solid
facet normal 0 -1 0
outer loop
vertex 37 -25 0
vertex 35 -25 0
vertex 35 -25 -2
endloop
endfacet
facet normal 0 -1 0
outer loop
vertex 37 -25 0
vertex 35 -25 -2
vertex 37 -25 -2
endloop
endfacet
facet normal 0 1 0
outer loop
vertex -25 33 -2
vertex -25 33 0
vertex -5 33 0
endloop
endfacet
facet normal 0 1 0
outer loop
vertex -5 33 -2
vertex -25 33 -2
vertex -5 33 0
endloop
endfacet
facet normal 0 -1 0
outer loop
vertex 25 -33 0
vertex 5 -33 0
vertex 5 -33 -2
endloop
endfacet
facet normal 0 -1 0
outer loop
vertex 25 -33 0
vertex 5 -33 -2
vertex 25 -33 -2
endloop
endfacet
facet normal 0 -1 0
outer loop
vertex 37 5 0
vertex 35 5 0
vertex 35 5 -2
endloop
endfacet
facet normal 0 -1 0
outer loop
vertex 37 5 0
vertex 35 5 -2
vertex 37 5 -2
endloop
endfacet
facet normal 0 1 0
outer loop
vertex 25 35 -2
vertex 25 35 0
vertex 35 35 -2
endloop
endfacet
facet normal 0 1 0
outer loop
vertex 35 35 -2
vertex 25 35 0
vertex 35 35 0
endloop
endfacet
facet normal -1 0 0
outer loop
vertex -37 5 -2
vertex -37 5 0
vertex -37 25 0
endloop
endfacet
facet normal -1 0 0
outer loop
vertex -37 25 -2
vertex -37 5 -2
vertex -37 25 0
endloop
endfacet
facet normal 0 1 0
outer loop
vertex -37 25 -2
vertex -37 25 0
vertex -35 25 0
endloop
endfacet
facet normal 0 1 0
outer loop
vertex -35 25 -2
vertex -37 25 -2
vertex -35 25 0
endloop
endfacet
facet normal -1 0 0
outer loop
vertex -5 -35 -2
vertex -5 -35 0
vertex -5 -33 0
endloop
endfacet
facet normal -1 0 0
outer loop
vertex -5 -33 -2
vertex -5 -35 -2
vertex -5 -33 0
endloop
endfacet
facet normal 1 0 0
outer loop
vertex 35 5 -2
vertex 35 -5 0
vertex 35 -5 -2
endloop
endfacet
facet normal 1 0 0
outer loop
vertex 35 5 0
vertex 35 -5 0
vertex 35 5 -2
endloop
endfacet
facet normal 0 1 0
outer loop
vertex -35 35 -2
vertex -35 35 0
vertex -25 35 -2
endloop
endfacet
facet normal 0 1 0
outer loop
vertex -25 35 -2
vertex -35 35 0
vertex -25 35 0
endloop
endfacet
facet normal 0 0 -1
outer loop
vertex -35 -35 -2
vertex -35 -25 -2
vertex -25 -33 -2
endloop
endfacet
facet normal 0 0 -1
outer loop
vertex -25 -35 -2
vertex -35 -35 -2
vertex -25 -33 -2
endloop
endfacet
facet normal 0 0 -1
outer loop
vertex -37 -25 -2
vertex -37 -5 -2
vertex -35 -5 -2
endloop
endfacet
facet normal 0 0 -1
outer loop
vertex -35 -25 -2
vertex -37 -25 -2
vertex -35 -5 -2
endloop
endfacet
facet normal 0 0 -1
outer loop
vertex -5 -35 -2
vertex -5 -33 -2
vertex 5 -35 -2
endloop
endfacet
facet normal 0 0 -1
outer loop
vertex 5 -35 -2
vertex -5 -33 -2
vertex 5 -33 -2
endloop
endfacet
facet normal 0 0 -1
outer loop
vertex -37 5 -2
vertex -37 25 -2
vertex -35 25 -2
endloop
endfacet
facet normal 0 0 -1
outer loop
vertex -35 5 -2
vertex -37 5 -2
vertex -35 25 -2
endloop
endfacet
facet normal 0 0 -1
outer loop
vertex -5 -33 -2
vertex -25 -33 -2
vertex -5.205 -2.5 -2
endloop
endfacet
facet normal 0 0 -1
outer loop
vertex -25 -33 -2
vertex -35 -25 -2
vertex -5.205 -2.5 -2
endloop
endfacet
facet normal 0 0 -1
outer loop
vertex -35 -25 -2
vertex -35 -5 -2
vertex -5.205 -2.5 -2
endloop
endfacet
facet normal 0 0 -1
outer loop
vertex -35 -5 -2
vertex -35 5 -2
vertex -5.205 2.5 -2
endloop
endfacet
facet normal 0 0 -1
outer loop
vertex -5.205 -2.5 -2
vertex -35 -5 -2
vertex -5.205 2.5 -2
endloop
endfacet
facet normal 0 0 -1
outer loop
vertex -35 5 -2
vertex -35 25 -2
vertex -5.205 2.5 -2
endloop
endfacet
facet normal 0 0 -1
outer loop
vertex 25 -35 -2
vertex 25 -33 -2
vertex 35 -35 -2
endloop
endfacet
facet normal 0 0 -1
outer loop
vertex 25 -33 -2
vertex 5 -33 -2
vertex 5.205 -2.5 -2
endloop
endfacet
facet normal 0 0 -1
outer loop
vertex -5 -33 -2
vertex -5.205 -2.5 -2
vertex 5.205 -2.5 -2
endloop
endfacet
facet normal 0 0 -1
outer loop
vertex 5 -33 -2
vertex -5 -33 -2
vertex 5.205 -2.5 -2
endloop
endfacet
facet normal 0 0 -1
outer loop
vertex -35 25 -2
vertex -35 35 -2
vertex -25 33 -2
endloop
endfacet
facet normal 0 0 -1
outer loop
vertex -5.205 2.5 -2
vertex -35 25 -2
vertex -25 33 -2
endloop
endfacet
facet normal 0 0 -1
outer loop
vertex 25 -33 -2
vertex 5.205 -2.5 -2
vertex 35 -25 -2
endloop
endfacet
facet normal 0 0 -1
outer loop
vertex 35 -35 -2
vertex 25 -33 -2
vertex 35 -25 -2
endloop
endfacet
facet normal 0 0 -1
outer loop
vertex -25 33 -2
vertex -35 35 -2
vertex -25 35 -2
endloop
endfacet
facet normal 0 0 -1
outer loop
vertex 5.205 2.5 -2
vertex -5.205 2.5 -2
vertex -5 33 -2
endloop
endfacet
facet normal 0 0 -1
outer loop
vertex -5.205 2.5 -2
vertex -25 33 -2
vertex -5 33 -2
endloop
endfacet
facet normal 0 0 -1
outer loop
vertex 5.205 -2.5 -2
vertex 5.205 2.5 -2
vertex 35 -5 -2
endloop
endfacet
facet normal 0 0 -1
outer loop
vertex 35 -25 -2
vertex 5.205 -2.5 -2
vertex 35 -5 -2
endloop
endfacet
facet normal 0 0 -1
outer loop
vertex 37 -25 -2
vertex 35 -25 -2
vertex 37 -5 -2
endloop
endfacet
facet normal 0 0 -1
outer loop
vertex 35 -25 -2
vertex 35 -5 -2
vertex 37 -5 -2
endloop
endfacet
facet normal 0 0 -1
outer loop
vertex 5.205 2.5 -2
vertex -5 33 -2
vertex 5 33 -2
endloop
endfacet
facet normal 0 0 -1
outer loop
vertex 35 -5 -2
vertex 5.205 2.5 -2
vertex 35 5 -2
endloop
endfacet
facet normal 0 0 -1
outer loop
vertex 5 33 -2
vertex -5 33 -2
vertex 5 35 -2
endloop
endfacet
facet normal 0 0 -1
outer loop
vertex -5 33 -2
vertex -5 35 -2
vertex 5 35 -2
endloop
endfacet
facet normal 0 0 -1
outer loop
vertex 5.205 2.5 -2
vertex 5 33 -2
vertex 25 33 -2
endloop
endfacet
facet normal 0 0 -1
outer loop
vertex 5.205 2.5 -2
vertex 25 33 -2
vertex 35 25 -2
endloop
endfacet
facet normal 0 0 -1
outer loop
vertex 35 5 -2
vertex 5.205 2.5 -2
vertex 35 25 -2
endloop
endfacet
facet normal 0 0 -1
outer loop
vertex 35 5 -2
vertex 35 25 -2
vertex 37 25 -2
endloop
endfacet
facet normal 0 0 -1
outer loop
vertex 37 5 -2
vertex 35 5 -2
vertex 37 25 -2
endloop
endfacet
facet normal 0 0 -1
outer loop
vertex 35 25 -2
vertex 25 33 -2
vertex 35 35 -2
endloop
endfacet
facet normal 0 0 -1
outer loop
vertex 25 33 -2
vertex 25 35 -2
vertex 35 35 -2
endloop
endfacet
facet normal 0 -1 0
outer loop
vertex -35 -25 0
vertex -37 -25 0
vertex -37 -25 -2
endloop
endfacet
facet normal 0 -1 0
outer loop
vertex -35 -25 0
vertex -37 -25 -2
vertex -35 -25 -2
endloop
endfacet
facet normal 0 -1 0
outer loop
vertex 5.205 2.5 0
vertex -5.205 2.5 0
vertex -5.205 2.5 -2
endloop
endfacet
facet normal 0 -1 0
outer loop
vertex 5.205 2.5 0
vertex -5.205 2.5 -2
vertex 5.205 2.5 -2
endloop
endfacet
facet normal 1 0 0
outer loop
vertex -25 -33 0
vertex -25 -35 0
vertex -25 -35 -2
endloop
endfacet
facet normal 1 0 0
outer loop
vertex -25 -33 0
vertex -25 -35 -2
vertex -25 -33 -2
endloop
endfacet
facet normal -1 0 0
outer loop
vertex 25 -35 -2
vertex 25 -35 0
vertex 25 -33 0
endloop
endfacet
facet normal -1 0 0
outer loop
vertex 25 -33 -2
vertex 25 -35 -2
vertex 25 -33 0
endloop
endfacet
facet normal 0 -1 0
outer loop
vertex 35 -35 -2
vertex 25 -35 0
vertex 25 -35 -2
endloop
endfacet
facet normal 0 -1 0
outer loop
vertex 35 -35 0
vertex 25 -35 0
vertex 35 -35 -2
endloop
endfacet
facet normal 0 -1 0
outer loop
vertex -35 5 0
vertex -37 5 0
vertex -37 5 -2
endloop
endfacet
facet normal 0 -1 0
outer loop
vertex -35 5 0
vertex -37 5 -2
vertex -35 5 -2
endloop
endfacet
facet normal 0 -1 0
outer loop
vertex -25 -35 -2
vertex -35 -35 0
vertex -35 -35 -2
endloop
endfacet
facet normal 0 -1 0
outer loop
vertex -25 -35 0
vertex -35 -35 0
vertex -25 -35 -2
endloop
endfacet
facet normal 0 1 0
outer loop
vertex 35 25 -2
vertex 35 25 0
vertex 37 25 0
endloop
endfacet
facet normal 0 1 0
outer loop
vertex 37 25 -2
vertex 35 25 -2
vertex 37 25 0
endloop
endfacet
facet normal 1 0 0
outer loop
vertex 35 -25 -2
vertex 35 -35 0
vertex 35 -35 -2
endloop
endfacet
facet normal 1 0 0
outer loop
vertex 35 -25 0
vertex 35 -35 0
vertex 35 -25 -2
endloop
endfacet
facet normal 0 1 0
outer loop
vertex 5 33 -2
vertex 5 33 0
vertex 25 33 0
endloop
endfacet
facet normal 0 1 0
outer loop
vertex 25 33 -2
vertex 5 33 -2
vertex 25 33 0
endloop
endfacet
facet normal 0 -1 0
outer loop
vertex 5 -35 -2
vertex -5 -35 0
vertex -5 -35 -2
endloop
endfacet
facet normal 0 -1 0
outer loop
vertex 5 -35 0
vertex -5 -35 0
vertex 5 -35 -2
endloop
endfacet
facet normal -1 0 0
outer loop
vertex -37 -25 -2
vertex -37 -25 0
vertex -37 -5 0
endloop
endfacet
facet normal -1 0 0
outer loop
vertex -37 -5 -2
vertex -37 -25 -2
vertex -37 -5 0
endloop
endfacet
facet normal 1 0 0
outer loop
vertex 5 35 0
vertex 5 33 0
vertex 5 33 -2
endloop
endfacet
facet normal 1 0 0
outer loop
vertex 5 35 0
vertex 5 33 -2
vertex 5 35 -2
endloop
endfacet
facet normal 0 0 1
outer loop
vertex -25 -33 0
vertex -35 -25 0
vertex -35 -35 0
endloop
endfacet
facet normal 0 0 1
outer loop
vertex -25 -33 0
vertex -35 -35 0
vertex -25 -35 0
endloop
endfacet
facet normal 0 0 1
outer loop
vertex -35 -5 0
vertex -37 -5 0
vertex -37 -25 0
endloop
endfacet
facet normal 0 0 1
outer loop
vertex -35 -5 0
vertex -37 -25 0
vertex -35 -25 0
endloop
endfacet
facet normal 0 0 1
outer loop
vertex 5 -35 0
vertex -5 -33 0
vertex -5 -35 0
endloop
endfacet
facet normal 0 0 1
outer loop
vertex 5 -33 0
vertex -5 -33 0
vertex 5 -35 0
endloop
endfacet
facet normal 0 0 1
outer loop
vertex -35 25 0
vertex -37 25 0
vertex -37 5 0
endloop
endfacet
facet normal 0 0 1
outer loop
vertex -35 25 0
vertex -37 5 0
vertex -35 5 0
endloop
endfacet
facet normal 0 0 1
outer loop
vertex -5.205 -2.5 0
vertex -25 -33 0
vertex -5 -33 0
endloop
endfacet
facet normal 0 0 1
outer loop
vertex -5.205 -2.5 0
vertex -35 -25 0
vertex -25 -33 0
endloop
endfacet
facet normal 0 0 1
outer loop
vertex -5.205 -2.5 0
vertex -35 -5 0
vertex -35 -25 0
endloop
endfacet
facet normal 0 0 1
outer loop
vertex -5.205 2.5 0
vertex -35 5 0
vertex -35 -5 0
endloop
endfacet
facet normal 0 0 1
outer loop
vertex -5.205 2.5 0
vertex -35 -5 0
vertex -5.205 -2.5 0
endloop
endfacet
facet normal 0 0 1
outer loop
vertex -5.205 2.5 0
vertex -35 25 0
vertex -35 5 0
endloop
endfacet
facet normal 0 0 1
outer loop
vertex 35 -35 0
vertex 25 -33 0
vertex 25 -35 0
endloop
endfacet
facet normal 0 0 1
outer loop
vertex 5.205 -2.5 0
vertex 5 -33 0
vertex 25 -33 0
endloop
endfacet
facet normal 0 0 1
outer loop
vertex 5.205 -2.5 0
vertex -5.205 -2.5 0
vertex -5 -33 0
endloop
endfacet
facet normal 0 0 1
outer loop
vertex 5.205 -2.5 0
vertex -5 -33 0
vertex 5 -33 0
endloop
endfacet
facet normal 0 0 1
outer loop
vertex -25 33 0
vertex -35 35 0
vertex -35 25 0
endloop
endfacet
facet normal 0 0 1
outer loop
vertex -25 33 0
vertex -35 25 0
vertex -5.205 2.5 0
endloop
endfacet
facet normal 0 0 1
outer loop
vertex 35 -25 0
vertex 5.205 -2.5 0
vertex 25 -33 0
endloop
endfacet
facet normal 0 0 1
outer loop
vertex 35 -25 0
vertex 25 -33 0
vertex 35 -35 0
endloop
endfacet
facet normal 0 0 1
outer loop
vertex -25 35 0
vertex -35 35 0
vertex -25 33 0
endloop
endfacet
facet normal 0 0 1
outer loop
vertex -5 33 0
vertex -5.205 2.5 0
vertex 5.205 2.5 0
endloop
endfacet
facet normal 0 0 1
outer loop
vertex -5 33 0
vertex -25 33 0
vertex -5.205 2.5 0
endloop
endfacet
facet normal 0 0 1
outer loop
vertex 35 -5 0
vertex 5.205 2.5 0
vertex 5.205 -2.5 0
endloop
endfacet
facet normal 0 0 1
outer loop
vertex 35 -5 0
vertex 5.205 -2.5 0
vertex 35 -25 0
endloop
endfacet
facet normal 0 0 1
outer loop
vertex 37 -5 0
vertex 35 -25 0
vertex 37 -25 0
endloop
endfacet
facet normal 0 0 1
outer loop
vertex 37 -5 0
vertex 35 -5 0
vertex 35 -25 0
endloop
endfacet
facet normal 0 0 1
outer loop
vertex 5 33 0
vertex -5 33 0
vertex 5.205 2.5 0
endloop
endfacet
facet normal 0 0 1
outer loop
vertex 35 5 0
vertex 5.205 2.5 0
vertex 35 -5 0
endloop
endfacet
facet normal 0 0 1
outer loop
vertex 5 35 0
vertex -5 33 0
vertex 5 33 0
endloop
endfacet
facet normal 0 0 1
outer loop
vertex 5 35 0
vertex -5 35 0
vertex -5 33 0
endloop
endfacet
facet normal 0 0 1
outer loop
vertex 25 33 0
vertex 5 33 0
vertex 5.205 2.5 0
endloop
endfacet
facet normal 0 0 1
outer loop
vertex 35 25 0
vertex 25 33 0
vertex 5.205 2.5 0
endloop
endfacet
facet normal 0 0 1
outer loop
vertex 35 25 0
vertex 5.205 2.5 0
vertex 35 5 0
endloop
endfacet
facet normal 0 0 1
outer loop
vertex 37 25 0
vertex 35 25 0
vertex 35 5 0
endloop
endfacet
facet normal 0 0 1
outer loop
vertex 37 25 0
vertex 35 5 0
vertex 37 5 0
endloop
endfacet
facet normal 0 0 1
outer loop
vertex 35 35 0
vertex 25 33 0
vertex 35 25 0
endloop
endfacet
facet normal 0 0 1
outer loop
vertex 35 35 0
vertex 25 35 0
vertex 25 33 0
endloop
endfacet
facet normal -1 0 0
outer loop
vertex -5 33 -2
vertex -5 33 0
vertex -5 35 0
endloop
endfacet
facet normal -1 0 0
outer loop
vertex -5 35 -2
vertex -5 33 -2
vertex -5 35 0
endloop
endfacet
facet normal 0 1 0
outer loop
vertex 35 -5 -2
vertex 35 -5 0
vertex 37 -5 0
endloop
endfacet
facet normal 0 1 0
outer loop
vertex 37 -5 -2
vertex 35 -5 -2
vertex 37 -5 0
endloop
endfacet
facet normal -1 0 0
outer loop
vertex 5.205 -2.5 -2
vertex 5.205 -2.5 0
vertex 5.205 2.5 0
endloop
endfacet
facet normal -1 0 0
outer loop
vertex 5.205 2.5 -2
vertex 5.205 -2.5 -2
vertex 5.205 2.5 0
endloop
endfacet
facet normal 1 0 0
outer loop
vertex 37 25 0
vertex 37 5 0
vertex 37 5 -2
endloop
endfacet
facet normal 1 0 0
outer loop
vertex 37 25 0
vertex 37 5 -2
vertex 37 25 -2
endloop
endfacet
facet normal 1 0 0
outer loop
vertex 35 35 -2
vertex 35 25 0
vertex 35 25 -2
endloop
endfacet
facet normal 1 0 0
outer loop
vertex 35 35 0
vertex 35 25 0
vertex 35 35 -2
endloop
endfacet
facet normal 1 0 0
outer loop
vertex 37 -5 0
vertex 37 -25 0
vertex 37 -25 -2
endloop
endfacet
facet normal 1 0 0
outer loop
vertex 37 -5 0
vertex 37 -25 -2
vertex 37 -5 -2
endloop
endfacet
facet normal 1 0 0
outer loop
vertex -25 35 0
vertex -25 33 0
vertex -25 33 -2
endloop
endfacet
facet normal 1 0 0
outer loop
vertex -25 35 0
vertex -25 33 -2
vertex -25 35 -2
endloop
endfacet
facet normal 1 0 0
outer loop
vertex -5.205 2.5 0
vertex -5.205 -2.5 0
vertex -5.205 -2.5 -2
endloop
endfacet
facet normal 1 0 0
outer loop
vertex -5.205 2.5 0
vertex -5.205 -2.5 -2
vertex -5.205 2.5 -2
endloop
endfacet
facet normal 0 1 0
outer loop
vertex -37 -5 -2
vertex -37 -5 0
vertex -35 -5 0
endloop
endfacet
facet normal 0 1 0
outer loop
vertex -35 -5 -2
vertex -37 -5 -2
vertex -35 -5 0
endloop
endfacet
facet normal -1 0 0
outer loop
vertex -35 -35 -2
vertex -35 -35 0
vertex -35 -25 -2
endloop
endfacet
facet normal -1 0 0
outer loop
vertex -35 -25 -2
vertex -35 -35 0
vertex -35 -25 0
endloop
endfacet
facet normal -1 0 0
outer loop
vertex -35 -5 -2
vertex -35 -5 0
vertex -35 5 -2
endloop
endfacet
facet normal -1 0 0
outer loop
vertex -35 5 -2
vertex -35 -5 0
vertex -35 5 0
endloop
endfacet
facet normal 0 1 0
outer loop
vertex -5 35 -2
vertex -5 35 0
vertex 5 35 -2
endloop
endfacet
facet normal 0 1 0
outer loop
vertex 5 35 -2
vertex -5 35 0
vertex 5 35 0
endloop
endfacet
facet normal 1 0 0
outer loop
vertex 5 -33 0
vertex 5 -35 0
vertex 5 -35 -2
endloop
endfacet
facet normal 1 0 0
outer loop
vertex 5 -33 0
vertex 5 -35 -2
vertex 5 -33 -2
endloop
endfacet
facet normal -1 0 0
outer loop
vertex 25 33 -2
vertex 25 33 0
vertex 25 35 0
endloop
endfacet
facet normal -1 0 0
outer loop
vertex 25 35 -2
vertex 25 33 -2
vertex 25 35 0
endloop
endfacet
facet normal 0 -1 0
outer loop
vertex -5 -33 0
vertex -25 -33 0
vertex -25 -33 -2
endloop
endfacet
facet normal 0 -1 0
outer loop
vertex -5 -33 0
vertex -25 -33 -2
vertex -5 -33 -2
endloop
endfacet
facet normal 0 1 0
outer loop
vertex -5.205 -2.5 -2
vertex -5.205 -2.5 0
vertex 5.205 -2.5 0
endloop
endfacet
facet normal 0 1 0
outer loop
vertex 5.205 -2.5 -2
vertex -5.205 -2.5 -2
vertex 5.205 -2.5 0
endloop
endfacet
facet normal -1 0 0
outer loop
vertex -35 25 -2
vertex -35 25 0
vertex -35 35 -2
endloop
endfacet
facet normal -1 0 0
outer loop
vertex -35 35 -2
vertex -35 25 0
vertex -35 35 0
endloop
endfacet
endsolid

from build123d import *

# Parameters (mm, degrees)
SKETCH1_W           = 70
SKETCH1_H           = 70
BOSS_EXTRUDE1_DEPTH = 2
SKETCH2_W           = 2
SKETCH2_H           = 20
BOSS_EXTRUDE2_DEPTH = 2
SKETCH3_W           = 20
SKETCH3_H           = 2
CUT_EXTRUDE1_DEPTH  = 2
SKETCH4_W           = 10.41
SKETCH4_H           = 5
CUT_EXTRUDE2_DEPTH  = 10


with BuildPart() as part:
    # Sketch1 → Boss-Extrude1 (new body)
    with BuildSketch(Plane.XY):
        Rectangle(SKETCH1_W, SKETCH1_H)
    extrude(amount=-BOSS_EXTRUDE1_DEPTH)

    # Sketch2 → Boss-Extrude2 (add)
    with BuildSketch(Plane.XY):
        with Locations((-36, 15)):
            Rectangle(SKETCH2_W, SKETCH2_H)
        with Locations((-36, -15)):
            Rectangle(SKETCH2_W, SKETCH2_H)
        with Locations((36, -15)):
            Rectangle(SKETCH2_W, SKETCH2_H)
        with Locations((36, 15)):
            Rectangle(SKETCH2_W, SKETCH2_H)
    extrude(amount=-BOSS_EXTRUDE2_DEPTH)

    # Sketch3 → Cut-Extrude1 (cut)
    with BuildSketch(Plane.XY):
        with Locations((-15, 34)):
            Rectangle(SKETCH3_W, SKETCH3_H)
        with Locations((15, 34)):
            Rectangle(SKETCH3_W, SKETCH3_H)
        with Locations((-15, -34)):
            Rectangle(SKETCH3_W, SKETCH3_H)
        with Locations((15, -34)):
            Rectangle(SKETCH3_W, SKETCH3_H)
    extrude(amount=-CUT_EXTRUDE1_DEPTH, mode=Mode.SUBTRACT)

    # Sketch4 → Cut-Extrude2 (cut)
    with BuildSketch(Plane.XY):
        Rectangle(SKETCH4_W, SKETCH4_H)
    extrude(amount=-CUT_EXTRUDE2_DEPTH, mode=Mode.SUBTRACT)


solid = part.part
